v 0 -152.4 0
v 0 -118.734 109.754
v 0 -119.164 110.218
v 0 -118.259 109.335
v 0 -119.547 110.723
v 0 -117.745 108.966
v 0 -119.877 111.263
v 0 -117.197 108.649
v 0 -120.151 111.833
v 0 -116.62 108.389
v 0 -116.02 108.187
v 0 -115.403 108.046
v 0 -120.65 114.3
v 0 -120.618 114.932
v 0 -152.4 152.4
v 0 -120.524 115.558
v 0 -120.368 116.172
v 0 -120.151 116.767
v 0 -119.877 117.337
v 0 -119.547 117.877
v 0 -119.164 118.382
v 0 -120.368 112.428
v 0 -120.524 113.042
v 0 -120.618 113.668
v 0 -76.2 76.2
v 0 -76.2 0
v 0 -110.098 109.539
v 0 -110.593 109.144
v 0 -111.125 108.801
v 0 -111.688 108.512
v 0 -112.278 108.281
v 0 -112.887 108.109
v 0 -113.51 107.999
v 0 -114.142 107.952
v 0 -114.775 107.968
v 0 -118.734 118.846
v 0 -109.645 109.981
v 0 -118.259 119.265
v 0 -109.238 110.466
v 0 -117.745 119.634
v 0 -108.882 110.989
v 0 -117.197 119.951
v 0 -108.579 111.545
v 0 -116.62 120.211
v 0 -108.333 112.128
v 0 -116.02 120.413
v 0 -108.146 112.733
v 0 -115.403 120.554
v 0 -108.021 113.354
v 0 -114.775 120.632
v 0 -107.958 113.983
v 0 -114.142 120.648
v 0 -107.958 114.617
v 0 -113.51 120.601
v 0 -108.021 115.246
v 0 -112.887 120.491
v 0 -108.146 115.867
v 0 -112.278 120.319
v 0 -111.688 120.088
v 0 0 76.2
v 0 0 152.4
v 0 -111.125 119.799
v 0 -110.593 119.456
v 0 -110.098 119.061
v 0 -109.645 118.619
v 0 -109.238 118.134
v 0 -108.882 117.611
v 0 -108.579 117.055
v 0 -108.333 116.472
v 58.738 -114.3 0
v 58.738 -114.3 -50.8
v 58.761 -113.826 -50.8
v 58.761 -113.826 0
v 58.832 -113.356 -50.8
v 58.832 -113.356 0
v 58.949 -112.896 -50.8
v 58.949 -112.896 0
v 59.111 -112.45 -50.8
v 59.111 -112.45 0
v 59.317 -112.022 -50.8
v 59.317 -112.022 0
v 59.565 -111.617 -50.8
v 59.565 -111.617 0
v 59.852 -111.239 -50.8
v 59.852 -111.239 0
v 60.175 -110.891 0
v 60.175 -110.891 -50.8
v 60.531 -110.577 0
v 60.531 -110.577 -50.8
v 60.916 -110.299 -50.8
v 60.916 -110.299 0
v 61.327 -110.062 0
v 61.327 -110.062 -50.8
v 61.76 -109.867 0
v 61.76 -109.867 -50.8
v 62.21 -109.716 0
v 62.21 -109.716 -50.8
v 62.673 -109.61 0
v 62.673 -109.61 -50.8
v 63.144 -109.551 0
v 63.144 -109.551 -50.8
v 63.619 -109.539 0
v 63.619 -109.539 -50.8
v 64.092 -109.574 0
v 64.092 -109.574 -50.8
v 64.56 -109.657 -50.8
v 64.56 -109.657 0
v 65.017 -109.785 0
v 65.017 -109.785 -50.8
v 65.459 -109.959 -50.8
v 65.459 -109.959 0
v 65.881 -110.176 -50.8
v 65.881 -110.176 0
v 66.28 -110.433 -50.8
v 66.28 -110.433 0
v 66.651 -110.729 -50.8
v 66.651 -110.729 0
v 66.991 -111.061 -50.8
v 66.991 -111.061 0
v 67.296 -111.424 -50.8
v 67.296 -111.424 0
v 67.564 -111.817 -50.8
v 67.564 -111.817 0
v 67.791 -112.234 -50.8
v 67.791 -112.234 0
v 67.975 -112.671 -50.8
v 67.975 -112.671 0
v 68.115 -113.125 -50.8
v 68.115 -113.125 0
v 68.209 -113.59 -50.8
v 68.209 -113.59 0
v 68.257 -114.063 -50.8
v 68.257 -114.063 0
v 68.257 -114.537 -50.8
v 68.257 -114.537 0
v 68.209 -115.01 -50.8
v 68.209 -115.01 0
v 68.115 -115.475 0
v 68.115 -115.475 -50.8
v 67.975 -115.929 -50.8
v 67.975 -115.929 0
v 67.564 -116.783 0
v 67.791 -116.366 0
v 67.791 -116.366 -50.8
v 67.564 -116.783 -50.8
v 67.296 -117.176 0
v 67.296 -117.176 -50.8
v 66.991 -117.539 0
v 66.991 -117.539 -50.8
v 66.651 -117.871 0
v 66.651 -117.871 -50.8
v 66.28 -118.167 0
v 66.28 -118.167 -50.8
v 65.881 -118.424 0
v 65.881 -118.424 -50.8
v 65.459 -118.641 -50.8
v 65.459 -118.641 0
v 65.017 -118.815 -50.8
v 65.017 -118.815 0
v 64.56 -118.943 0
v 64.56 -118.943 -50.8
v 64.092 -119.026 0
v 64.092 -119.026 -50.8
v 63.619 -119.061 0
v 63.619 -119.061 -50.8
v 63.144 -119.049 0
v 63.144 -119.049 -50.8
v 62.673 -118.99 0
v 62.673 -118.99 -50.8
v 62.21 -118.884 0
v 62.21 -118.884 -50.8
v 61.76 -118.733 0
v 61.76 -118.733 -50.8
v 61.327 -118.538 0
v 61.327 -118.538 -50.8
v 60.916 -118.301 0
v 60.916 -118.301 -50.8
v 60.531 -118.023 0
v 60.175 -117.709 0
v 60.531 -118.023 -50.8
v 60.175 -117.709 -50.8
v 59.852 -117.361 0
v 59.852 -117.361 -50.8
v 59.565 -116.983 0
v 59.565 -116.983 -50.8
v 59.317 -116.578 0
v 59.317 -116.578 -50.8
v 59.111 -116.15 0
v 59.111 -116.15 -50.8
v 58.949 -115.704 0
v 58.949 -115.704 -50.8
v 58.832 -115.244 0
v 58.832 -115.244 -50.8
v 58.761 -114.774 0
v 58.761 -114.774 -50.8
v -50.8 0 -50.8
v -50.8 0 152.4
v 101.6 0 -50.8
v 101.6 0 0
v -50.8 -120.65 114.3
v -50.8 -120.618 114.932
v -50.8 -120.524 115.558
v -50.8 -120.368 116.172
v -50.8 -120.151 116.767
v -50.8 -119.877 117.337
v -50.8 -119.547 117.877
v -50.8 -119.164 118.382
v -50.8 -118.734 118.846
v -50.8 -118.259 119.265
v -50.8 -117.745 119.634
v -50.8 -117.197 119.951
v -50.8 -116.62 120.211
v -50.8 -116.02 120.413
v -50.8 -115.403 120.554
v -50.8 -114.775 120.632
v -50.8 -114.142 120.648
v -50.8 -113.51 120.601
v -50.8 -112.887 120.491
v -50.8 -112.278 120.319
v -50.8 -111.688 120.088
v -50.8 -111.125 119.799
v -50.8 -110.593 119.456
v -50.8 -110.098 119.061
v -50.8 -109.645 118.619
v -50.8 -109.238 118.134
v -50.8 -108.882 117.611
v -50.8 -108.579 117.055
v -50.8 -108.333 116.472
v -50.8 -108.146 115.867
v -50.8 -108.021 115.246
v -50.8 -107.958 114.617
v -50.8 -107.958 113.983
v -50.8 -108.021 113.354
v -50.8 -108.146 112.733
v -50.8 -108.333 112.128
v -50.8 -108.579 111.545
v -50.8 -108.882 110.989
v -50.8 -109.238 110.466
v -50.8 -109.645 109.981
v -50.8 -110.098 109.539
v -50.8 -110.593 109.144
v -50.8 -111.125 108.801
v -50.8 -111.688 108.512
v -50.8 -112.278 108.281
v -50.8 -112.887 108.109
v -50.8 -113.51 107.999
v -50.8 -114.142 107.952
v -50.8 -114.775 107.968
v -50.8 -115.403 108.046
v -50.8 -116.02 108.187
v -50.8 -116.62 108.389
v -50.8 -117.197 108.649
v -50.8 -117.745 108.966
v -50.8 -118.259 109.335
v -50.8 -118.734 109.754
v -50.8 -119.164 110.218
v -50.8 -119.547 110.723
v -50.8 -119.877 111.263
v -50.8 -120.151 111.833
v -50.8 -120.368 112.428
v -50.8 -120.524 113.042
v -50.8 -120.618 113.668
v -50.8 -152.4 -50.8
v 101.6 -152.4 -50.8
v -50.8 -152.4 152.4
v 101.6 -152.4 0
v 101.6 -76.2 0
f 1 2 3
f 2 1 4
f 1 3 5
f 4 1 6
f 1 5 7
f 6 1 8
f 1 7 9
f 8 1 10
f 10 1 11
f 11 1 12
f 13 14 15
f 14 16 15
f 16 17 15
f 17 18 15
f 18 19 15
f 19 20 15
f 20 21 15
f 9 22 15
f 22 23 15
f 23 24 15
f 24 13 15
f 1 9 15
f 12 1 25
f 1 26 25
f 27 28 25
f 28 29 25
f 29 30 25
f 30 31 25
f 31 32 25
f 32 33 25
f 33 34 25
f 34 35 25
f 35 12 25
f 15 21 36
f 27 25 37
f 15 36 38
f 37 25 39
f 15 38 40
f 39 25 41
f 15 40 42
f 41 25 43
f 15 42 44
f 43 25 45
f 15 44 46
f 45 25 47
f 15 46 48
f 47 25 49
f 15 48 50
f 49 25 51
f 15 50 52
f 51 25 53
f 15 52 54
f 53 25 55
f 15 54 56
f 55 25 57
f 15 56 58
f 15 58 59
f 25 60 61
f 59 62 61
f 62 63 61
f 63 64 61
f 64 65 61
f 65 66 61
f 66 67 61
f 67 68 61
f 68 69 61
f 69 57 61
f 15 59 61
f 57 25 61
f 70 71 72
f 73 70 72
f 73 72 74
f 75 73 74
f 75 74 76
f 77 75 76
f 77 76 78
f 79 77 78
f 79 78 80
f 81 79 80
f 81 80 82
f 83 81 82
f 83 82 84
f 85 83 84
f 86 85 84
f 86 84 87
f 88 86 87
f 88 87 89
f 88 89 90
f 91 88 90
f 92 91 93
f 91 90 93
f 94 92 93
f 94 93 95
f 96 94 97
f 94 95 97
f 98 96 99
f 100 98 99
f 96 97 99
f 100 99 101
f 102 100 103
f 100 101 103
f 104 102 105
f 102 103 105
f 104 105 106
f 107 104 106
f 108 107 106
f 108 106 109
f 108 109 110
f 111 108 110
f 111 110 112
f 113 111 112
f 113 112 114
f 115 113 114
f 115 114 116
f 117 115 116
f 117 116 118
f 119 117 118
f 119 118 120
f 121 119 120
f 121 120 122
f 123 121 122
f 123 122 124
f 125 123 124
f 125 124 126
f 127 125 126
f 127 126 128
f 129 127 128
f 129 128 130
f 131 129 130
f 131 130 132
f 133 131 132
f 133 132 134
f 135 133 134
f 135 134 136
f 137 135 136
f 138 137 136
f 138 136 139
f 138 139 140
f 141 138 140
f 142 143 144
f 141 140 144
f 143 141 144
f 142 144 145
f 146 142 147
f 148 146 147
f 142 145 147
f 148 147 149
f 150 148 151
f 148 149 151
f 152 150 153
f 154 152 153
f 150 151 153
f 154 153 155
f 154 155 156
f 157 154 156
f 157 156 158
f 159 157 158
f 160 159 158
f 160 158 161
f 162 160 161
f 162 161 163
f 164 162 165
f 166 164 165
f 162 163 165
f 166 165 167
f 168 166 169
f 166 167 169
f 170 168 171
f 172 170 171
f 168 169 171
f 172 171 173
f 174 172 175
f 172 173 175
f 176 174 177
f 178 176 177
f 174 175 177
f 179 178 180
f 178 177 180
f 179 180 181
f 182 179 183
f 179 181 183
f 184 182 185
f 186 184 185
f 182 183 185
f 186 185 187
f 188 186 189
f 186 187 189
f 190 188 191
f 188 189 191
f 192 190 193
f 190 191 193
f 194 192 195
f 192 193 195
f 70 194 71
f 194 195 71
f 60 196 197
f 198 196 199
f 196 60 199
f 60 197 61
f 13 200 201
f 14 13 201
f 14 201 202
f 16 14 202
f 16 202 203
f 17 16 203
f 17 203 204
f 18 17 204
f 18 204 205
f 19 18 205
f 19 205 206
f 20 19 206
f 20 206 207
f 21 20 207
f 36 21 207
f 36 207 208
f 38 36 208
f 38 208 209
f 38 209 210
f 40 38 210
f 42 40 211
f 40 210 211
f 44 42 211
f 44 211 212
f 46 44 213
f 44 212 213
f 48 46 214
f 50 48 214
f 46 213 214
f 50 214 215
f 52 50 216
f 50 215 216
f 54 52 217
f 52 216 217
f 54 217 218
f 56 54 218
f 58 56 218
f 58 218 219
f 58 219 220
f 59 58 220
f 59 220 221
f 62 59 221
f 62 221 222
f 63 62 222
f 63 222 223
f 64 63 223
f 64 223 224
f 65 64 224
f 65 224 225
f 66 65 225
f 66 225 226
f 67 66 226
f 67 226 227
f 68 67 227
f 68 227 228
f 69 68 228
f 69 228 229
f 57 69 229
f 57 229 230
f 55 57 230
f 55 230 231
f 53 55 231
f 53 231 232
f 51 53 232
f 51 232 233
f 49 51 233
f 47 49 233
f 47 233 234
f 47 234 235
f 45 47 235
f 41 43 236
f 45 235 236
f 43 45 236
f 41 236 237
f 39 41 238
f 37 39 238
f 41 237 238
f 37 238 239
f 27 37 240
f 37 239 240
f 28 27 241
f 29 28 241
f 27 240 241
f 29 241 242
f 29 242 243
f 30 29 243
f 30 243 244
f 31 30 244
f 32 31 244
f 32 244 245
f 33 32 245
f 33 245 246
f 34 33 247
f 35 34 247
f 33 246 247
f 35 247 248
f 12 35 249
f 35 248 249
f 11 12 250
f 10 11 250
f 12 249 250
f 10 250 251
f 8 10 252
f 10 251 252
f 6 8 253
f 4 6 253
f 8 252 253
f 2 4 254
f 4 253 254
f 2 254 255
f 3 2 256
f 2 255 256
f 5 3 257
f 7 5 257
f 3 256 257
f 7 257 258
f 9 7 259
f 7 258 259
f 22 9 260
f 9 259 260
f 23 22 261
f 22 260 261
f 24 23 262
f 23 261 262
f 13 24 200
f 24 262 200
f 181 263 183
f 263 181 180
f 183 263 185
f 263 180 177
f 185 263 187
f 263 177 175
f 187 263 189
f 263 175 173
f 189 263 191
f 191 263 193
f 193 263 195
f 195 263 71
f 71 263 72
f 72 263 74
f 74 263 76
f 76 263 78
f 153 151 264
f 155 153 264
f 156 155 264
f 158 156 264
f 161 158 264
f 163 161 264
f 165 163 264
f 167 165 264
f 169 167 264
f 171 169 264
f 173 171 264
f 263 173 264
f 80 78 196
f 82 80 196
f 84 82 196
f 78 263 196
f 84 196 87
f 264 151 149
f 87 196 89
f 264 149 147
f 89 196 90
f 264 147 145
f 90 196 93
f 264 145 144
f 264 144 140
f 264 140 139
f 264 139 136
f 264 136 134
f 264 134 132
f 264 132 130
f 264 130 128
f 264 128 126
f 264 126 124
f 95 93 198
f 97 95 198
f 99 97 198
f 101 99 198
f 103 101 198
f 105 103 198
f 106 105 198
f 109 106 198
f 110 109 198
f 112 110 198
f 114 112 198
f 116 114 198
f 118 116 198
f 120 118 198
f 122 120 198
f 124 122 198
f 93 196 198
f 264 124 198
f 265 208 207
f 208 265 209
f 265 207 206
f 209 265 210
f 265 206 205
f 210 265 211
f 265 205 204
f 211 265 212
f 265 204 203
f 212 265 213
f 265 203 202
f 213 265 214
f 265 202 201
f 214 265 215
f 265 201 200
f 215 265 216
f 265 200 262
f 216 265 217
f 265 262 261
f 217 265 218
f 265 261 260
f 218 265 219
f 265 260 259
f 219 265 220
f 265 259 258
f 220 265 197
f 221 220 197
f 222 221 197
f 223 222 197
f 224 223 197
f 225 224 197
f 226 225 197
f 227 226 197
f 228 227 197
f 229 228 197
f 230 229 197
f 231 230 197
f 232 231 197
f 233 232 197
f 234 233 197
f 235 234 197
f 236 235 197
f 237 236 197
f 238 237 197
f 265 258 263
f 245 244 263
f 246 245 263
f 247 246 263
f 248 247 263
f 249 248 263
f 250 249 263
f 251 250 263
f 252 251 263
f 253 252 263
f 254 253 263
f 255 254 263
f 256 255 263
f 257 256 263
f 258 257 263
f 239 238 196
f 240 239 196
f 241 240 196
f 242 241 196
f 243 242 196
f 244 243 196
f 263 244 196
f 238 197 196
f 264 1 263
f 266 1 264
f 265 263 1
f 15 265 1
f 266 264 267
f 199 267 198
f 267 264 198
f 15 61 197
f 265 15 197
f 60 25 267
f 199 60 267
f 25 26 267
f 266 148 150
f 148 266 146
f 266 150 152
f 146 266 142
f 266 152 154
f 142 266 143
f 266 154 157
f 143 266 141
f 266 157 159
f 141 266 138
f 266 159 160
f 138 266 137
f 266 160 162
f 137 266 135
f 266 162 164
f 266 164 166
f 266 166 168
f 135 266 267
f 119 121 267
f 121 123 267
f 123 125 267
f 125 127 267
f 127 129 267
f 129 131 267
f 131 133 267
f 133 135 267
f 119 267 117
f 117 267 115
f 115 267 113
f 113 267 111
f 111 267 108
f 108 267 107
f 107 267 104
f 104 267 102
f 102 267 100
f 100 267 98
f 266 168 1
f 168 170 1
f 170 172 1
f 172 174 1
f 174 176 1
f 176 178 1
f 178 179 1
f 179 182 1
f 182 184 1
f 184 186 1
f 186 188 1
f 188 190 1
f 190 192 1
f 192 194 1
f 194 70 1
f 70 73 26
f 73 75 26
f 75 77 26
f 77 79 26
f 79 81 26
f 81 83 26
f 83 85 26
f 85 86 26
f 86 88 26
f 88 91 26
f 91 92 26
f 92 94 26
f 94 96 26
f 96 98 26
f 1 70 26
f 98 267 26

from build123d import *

# Parameters (mm, degrees)
F1_DEPTH = 152.4
F2_W     = 101.6
F2_H     = 76.2
F3_DEPTH = 76.2
F5_DEPTH = 76.2
F7_D     = 12.7
F9_D     = 9.525


with BuildPart() as f1:
    # F0 (on Front) → F1 (new body)
    with BuildSketch(Plane.XZ):
        Polygon((0, 152.4), (-50.8, 152.4), (-50.8, -50.8), (101.6, -50.8), (101.6, 0), (0, 0), align=None)
    extrude(amount=F1_DEPTH)

    # F2 (on face) → F3 (join)
    with BuildSketch(Plane.XY):
        with Locations((50.8, -38.1)):
            Rectangle(F2_W, F2_H)
    extrude(amount=F3_DEPTH)

    # F4 (on face) → F5 (cut)
    with BuildSketch(Plane.XZ.offset(76.2)):
        Polygon((101.6, 76.2), (0, 76.2), (101.6, 0), align=None)
    extrude(amount=-F5_DEPTH, mode=Mode.SUBTRACT)

    # F7 (through all)
    with Locations(Plane.YZ):
        with Locations((-114.3, 114.3)):
            Hole(F7_D / 2)

    # F9 (through all)
    with Locations(Plane.XY):
        with Locations((63.5, -114.3)):
            Hole(F9_D / 2)


solid = f1.part
